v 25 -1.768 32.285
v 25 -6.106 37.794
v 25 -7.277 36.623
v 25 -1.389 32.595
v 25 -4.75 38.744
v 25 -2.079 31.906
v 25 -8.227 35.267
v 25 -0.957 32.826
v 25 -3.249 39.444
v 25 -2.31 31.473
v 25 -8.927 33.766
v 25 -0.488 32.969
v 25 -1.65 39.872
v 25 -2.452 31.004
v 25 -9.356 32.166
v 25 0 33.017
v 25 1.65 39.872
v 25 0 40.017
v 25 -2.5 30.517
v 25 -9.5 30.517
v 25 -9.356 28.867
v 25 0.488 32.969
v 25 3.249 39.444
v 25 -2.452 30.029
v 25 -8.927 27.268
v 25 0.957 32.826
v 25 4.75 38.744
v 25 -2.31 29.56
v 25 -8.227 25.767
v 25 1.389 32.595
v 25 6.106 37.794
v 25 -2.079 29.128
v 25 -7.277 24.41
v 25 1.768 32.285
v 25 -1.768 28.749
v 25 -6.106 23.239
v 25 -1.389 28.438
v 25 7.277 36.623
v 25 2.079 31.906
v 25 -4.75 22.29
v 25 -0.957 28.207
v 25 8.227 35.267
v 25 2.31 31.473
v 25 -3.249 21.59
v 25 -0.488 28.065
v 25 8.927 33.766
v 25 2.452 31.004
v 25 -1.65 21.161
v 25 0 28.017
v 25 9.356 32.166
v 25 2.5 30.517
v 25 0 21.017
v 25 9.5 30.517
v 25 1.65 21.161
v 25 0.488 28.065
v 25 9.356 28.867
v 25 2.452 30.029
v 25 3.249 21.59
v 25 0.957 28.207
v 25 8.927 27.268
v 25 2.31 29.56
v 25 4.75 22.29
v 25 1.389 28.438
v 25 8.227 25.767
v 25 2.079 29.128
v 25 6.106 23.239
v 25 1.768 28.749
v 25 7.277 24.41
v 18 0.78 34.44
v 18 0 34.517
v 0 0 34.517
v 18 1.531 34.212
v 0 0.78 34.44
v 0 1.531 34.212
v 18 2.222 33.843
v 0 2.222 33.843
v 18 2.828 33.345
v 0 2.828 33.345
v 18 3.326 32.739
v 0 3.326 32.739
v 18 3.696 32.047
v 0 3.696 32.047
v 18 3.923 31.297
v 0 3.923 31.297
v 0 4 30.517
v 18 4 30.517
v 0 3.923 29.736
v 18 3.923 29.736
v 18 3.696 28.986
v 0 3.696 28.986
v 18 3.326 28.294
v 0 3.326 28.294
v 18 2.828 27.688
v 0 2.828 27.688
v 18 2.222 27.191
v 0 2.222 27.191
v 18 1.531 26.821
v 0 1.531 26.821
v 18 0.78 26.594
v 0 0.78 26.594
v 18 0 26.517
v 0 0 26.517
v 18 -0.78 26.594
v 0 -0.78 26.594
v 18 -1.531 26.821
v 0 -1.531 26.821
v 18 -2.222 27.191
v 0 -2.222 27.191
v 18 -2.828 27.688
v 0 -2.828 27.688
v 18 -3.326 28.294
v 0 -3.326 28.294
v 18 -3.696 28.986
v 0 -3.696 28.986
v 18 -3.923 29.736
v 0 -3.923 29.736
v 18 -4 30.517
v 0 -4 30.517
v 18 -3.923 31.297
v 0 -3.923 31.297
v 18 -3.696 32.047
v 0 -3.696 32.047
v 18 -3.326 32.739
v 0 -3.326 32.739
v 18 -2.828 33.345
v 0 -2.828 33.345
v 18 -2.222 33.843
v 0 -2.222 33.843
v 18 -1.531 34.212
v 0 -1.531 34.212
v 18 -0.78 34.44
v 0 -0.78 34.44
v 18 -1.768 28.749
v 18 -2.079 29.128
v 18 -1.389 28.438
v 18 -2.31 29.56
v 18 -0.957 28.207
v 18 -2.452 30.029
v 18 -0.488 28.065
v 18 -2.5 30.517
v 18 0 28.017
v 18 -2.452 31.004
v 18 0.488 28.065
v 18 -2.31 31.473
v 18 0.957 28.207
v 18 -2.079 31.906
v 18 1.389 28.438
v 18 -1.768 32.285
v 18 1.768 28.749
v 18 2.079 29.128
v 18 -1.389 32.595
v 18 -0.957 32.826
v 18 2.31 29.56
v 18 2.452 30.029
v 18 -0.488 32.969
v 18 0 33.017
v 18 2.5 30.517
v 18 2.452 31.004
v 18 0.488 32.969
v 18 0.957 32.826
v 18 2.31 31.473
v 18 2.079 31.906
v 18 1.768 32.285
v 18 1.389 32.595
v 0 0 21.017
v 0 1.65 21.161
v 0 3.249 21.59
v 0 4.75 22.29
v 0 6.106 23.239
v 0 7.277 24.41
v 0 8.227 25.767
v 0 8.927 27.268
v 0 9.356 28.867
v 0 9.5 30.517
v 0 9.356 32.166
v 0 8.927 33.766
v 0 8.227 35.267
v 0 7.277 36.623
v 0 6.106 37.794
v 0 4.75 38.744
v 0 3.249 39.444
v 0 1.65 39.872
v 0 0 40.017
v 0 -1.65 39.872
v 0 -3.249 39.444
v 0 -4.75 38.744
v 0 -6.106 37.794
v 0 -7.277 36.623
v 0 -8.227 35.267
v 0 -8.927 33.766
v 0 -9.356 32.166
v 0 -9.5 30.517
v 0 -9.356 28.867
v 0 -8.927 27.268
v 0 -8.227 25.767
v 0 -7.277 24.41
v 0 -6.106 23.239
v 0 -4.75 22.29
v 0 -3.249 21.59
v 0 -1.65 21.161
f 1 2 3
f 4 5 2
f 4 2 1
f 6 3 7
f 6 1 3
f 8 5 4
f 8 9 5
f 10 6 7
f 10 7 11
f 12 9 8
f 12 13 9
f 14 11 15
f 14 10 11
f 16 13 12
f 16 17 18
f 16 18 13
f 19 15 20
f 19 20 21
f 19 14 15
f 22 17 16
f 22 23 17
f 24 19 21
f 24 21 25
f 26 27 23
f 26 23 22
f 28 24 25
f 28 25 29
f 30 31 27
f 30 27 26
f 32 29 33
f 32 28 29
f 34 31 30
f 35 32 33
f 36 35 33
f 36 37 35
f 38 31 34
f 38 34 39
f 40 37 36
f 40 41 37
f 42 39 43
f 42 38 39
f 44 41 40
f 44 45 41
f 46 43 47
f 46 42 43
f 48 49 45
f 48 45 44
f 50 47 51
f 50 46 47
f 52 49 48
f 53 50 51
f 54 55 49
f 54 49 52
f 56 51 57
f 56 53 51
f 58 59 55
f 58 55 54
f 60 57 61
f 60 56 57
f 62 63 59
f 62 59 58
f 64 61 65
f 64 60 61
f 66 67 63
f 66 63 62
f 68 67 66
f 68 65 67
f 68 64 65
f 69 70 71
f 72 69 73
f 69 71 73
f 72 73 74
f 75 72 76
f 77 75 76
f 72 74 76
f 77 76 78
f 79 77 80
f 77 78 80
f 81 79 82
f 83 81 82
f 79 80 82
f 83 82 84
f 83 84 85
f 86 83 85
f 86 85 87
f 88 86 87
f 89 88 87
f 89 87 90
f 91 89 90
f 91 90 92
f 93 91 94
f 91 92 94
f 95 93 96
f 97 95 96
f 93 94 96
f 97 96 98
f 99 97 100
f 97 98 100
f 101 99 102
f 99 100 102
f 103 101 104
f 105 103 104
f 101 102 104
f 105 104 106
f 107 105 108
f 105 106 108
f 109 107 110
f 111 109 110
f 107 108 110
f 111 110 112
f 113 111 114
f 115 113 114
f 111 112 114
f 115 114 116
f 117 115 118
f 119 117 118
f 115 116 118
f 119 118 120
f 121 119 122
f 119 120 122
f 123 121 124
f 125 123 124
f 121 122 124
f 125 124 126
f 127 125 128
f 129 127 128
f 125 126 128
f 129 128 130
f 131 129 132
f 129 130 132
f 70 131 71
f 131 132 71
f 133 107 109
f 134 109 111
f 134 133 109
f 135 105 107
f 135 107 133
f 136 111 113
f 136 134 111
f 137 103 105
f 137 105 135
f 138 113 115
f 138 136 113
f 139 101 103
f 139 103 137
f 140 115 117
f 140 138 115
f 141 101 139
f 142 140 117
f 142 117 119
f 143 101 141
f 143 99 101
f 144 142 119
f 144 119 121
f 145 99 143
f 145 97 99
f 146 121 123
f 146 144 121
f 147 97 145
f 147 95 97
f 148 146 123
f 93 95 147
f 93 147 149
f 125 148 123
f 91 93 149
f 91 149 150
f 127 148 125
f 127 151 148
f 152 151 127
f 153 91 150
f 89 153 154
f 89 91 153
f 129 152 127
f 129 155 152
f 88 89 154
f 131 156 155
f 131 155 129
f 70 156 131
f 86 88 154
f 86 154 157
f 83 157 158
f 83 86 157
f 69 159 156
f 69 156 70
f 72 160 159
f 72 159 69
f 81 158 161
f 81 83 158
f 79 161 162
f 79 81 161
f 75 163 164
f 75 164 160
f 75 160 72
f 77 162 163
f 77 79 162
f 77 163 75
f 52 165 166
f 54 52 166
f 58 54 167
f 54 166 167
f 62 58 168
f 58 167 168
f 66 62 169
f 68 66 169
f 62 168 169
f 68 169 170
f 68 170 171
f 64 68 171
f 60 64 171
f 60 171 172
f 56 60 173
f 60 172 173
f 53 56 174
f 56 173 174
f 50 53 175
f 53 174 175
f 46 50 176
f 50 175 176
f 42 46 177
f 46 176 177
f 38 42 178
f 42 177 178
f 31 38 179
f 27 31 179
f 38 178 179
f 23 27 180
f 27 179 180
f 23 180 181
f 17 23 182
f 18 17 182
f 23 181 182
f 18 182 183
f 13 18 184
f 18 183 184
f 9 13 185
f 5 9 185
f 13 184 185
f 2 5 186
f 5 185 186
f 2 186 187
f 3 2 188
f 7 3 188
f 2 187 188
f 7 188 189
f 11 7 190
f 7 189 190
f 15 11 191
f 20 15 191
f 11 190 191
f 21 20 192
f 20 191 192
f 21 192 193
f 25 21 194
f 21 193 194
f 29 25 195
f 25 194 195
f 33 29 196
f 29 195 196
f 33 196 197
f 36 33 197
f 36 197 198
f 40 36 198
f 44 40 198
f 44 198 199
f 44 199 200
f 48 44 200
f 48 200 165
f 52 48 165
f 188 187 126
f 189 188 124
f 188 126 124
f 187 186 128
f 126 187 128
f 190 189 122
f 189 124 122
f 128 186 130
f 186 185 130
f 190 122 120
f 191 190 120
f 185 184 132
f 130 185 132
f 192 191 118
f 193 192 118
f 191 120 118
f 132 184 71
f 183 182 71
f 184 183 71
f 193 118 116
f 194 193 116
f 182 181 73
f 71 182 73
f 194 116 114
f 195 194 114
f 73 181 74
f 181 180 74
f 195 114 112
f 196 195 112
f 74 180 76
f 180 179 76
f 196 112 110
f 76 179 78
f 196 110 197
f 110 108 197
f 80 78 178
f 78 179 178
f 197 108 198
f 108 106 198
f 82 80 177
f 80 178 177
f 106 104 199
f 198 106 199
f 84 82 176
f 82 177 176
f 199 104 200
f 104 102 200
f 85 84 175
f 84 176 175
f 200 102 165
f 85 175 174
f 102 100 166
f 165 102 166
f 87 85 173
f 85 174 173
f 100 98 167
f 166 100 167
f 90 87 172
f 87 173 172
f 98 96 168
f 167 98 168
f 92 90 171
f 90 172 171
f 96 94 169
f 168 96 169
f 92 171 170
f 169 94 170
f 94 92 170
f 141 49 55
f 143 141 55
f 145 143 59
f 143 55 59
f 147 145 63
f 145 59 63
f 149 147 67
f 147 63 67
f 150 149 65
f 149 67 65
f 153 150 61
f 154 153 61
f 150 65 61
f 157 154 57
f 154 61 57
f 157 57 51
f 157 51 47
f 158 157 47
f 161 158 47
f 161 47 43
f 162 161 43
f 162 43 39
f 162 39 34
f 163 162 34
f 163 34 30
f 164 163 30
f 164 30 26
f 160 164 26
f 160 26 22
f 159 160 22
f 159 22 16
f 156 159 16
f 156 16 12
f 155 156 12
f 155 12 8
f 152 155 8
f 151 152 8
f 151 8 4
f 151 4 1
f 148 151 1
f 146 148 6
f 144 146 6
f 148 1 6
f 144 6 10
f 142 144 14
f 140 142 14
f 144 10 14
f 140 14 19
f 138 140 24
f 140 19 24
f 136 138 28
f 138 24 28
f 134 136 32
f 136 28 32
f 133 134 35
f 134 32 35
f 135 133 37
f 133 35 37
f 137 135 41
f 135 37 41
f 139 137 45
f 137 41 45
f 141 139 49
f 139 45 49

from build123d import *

# Parameters (mm, degrees)
SKETCH_1_R          = 9.5
EXTRUDE_1_DEPTH     = 25
SKETCH_2_R          = 4
CUT_EXTRUDE_1_DEPTH = 18
SKETCH_3_R          = 2.5
CUT_EXTRUDE_2_DEPTH = 18


with BuildPart() as part:
    # 草图1 → 凸台-拉伸1 (new body)
    with BuildSketch(Plane(origin=(0, 0, 0), x_dir=(0, 0, -1), z_dir=(1, 0, 0))):
        with Locations((-30.516757785, 0)):
            Circle(SKETCH_1_R)
    extrude(amount=EXTRUDE_1_DEPTH)

    # 草图2 → 切除-拉伸1 (cut)
    with BuildSketch(Plane.ZY):
        with Locations((30.516757785, 0)):
            Circle(SKETCH_2_R)
    extrude(amount=-CUT_EXTRUDE_1_DEPTH, mode=Mode.SUBTRACT)

    # 草图3 → 切除-拉伸2 (cut)
    with BuildSketch(Plane(origin=(25, 0, 0), x_dir=(0, 0, -1), z_dir=(1, 0, 0))):
        with Locations((-30.516757785, 0)):
            Circle(SKETCH_3_R)
    extrude(amount=-CUT_EXTRUDE_2_DEPTH, mode=Mode.SUBTRACT)


solid = part.part
